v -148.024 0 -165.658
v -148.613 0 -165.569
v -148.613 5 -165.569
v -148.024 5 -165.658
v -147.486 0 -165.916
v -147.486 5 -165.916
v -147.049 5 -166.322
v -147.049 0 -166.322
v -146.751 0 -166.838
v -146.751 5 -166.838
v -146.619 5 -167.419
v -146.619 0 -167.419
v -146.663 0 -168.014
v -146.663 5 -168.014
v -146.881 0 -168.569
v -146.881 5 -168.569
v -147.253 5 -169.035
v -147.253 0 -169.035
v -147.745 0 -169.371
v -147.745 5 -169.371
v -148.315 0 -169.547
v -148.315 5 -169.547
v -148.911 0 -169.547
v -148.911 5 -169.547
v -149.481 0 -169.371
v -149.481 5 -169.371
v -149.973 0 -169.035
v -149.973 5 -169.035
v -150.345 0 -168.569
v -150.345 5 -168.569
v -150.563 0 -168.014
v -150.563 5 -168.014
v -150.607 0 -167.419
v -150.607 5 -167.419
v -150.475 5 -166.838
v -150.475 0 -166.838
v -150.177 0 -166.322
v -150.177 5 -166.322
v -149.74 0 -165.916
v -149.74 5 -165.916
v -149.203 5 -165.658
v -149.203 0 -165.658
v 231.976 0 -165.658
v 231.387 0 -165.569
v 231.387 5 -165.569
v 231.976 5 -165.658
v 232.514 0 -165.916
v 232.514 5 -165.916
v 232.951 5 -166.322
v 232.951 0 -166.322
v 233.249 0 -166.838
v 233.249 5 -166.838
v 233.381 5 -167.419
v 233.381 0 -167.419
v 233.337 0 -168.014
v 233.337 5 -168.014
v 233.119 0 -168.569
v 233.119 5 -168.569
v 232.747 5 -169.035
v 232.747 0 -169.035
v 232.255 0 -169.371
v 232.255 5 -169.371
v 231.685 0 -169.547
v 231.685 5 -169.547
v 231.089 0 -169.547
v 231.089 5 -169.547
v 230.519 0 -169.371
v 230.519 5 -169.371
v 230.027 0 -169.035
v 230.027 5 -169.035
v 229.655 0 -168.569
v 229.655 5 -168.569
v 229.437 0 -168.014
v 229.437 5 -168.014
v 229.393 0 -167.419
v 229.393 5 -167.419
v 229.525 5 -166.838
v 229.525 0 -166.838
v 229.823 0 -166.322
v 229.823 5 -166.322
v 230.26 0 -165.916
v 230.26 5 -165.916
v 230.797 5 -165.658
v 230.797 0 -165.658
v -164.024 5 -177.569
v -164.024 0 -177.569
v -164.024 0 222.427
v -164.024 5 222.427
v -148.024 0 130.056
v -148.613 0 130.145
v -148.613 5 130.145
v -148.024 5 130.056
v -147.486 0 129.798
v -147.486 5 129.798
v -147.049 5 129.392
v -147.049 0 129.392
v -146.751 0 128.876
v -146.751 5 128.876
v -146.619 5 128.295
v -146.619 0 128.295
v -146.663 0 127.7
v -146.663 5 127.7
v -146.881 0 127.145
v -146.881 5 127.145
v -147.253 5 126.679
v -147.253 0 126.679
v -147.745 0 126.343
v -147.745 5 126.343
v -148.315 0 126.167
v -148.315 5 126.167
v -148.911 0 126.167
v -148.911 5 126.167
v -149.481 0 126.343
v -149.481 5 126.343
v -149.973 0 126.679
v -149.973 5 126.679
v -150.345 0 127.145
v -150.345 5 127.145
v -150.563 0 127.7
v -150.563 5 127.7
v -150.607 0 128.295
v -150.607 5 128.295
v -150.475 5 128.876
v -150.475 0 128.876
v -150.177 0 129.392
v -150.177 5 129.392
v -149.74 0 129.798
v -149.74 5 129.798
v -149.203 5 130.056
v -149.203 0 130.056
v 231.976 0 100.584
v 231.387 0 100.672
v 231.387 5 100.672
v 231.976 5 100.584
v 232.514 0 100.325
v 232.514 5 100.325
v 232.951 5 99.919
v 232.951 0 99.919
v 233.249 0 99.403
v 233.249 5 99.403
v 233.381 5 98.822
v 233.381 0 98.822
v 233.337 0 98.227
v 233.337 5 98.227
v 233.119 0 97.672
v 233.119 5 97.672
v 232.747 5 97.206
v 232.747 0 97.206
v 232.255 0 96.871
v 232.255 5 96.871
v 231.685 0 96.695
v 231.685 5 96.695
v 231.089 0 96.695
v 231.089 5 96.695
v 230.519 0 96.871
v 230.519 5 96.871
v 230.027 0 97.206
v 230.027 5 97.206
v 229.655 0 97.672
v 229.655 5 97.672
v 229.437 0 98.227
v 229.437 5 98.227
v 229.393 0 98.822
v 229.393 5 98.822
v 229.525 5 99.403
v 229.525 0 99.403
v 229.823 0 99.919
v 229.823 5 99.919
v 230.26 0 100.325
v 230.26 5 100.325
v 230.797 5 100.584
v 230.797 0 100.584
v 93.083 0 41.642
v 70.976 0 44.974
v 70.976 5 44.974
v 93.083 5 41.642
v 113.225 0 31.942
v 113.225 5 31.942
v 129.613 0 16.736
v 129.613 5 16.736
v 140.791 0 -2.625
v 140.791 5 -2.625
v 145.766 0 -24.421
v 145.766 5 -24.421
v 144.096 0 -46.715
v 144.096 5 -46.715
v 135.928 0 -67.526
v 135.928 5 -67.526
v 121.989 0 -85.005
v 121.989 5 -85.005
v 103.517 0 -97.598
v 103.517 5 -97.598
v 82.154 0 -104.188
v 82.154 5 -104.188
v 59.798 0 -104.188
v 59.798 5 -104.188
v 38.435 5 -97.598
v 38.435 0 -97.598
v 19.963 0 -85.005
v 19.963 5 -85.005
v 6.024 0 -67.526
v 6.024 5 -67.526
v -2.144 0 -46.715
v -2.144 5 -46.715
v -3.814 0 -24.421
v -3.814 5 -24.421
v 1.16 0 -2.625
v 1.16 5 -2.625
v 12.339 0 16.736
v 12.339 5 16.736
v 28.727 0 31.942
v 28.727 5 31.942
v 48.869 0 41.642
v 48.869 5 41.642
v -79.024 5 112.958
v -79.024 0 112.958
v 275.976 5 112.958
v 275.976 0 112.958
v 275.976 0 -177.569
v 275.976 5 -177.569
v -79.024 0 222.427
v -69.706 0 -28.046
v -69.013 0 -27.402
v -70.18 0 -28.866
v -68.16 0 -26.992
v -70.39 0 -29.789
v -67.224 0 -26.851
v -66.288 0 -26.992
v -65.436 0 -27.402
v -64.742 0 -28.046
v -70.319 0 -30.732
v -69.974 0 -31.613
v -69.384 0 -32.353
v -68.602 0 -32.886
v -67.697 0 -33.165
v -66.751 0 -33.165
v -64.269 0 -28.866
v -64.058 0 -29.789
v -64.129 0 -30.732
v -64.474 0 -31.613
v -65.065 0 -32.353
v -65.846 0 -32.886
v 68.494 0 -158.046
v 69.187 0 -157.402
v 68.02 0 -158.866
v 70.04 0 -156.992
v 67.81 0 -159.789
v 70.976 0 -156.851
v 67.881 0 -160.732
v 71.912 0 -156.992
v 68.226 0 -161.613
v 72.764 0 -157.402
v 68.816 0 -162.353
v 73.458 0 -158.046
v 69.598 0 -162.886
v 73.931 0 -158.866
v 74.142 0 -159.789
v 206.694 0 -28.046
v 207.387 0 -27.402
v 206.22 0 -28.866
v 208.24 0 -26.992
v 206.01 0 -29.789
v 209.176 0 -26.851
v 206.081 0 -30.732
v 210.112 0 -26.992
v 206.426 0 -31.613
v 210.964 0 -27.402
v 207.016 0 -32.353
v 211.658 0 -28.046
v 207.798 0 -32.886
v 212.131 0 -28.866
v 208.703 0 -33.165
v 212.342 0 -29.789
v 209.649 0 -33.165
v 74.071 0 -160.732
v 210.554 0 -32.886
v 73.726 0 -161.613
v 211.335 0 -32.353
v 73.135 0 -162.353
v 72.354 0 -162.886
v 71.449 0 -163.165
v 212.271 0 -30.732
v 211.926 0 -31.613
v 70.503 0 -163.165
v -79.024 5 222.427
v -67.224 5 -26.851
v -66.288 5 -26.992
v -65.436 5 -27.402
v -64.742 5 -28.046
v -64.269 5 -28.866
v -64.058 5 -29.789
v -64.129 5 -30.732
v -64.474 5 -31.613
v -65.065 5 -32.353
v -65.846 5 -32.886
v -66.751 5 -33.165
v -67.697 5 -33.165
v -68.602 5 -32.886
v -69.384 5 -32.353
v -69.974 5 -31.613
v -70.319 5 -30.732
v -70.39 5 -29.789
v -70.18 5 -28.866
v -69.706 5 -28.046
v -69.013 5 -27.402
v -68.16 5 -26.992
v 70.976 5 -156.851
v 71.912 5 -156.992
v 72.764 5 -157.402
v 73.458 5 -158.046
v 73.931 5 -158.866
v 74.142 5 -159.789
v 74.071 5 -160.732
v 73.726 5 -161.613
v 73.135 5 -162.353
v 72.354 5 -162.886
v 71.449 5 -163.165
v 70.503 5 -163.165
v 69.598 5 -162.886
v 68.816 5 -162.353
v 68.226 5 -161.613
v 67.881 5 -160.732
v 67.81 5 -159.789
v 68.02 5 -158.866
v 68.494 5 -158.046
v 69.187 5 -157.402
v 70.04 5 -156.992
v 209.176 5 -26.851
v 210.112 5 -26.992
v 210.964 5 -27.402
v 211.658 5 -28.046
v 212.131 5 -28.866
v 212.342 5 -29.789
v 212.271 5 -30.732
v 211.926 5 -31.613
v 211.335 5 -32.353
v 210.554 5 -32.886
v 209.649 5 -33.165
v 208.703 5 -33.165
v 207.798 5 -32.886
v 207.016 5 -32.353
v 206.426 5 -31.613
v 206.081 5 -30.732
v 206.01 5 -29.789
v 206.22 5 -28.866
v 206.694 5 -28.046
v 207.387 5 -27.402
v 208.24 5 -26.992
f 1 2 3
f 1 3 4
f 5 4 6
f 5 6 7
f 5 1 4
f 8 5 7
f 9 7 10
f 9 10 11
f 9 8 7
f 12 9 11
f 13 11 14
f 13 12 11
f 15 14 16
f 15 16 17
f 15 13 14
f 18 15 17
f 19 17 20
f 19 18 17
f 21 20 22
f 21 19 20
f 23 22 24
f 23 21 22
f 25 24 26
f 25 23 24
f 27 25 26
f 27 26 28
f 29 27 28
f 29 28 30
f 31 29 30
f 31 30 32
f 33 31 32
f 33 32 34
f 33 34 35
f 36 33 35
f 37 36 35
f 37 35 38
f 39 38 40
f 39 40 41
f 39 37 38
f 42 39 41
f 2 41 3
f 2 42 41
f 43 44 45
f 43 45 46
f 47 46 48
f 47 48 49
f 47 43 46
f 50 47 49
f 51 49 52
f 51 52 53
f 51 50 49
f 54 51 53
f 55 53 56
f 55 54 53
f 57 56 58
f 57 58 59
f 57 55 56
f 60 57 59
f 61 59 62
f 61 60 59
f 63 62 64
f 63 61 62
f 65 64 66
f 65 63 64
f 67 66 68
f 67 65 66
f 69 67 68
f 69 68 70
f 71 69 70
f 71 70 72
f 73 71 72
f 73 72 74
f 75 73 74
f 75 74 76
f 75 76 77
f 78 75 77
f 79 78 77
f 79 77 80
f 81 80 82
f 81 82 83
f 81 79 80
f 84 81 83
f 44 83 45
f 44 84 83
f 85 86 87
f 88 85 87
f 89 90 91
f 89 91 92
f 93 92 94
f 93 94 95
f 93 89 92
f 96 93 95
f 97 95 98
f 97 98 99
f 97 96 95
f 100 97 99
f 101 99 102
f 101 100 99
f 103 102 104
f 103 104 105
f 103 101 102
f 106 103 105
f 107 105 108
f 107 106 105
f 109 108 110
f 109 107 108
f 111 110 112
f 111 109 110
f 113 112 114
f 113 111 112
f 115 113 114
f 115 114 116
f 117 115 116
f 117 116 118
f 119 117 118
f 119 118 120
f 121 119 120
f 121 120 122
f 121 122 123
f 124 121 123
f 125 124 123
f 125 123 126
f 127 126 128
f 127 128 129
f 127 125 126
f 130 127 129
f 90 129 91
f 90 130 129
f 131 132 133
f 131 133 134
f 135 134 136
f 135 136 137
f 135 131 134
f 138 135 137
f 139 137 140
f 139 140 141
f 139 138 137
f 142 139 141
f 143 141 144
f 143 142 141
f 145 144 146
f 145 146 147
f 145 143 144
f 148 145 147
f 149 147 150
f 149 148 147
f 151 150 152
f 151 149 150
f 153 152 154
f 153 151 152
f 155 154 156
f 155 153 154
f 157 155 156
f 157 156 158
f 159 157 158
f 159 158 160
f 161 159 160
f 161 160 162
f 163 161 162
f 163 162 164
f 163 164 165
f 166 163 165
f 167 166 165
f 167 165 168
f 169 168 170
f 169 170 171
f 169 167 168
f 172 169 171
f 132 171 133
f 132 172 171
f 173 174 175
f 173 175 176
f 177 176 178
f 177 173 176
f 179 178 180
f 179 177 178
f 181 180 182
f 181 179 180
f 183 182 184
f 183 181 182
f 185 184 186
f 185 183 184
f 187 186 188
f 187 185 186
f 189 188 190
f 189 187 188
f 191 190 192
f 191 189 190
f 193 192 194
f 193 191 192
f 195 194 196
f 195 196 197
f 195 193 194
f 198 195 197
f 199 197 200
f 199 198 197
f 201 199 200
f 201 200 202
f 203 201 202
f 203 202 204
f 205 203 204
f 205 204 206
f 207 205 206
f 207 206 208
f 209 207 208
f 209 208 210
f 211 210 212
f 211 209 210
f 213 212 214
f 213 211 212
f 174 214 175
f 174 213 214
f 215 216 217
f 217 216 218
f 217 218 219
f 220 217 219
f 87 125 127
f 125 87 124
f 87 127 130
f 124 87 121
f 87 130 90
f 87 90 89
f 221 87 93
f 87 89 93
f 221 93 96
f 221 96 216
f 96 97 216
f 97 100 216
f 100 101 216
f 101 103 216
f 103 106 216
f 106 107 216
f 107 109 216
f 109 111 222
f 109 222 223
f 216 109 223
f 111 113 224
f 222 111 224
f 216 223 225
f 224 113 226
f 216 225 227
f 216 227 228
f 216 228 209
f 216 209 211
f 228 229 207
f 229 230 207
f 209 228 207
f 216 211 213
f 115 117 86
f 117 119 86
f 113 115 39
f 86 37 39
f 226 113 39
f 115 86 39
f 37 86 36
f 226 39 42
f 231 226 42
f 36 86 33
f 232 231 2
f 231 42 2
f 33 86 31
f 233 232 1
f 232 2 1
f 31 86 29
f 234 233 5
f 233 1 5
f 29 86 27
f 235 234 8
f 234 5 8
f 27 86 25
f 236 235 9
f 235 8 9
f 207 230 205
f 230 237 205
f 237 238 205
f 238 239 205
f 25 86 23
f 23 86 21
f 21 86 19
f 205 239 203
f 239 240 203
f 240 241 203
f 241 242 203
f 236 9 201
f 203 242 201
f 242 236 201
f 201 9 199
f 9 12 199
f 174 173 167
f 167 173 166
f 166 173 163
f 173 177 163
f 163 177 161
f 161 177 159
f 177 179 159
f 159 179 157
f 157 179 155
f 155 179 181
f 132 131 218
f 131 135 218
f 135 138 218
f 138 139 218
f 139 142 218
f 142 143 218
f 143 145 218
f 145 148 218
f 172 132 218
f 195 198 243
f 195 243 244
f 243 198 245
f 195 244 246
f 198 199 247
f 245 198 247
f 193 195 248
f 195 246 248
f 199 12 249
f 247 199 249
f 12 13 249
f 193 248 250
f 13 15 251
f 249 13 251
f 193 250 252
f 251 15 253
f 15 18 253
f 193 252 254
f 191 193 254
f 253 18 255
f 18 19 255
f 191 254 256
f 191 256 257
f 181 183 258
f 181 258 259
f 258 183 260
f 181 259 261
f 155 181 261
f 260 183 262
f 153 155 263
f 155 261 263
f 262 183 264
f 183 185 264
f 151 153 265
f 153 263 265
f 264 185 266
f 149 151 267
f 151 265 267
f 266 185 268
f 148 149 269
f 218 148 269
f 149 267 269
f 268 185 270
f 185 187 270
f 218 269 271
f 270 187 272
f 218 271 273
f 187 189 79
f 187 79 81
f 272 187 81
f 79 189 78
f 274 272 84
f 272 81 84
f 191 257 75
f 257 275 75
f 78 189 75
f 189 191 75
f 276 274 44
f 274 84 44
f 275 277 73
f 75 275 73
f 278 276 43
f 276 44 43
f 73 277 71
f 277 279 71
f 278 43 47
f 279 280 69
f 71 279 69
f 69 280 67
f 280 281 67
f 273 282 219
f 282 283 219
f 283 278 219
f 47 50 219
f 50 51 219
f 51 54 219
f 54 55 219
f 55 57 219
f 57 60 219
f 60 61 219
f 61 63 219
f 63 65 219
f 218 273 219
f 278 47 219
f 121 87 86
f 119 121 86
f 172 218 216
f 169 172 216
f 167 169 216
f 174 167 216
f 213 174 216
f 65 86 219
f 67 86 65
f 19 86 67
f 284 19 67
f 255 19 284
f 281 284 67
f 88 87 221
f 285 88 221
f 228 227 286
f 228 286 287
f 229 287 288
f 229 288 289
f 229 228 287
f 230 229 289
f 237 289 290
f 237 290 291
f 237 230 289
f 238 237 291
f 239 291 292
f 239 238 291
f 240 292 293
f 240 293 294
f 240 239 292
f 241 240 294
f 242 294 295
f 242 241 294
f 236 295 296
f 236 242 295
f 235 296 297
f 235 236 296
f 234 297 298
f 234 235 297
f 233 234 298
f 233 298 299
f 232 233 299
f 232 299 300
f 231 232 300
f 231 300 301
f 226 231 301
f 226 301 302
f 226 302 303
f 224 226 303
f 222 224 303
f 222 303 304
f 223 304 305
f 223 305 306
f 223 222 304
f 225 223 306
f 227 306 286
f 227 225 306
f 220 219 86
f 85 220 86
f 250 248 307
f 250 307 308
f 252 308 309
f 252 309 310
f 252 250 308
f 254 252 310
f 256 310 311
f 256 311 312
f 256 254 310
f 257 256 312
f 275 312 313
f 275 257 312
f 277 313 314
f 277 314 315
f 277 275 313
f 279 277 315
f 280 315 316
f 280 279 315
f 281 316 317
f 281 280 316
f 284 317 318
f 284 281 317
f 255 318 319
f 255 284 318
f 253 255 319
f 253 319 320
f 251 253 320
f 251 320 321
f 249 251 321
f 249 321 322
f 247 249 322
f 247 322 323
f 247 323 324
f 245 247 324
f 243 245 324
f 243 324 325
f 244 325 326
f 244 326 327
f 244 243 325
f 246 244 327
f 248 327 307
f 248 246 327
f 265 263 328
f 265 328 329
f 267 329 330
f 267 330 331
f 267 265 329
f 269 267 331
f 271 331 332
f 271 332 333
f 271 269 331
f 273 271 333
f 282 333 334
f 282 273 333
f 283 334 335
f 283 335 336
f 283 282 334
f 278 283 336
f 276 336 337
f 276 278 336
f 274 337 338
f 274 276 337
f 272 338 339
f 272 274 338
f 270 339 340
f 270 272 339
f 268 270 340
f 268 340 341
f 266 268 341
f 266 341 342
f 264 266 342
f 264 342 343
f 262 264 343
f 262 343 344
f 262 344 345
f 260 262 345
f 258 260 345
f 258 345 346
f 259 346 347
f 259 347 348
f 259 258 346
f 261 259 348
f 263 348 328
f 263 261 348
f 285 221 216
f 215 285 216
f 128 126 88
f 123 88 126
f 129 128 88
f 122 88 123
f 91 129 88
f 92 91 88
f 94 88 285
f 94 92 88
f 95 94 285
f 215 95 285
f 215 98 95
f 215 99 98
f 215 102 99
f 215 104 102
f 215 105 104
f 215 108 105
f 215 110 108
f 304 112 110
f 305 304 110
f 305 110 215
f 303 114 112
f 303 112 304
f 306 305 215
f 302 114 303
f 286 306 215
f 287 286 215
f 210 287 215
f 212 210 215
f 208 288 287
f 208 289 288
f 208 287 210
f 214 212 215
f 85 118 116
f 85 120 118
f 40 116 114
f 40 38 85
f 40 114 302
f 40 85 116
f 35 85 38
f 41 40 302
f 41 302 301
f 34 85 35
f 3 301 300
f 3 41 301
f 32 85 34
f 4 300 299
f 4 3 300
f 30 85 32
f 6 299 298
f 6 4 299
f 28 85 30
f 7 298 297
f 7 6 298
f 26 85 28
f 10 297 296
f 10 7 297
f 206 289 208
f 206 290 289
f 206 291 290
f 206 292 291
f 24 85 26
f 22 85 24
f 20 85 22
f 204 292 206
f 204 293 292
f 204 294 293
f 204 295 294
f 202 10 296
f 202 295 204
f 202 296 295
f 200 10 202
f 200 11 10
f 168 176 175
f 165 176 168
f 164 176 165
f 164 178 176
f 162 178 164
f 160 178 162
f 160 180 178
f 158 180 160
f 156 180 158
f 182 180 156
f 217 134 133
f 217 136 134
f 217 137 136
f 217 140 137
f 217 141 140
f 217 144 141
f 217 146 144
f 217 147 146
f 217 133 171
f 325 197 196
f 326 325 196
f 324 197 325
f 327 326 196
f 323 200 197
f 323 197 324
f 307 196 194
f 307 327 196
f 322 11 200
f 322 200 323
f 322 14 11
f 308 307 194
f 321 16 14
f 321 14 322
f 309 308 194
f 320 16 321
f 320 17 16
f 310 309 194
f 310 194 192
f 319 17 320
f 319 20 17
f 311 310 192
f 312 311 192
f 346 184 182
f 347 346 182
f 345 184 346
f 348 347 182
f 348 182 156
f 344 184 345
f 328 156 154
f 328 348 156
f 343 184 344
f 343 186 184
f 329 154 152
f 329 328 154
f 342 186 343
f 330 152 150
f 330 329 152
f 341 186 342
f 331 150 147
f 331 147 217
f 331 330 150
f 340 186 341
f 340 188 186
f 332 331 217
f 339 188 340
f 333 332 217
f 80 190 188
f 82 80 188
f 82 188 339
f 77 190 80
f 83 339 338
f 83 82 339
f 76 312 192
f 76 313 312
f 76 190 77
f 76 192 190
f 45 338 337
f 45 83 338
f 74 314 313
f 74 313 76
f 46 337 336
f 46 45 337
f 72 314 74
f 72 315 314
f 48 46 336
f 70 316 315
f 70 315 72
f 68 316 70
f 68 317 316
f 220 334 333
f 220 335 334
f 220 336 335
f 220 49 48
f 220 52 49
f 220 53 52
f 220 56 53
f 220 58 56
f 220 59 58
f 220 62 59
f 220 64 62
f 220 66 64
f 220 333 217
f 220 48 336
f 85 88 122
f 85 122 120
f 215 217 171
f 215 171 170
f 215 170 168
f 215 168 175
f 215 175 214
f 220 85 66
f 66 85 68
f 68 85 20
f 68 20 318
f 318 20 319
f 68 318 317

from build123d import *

# Parameters (mm, degrees)
CROQUIS2_R              = 75
CROQUIS2_R_2            = 2
CROQUIS2_R_3            = 3.175
SALIENTE_EXTRUIR2_DEPTH = 5


with BuildPart() as part:
    # Croquis2 → Saliente-Extruir2 (new body)
    with BuildSketch(Plane(origin=(0, 0, 0), x_dir=(1, 0, 0), z_dir=(0, 1, 0))):
        Polygon((-164.024069274, 177.568942162), (-164.024069274, -142.431057838), (-164.024069274, -189.256710106), (-164.024069274, -222.426710106), (-79.024069274, -222.426710106), (-79.024069274, -189.256710106), (-79.024069274, -142.431057838), (-79.024069274, -112.958468136), (275.975930726, -112.958468136), (275.975930726, 177.568942162), align=None)
        with Locations(Location((70.975930726, 30.02579809, 0), (0, 0, 270))):
            Circle(CROQUIS2_R, mode=Mode.SUBTRACT)
        with Locations(Location((-148.613055051, 167.568942162, 0), (0, 0, 270))):
            Circle(CROQUIS2_R_2, mode=Mode.SUBTRACT)
        with Locations(Location((-148.613055051, -128.145081947, 0), (0, 0, 270))):
            Circle(CROQUIS2_R_2, mode=Mode.SUBTRACT)
        with Locations(Location((231.386944949, -98.672492245, 0), (0, 0, 270))):
            Circle(CROQUIS2_R_2, mode=Mode.SUBTRACT)
        with Locations(Location((231.386944949, 167.568942162, 0), (0, 0, 270))):
            Circle(CROQUIS2_R_2, mode=Mode.SUBTRACT)
        with Locations(Location((209.175930726, 30.02579809, 0), (0, 0, 270))):
            Circle(CROQUIS2_R_3, mode=Mode.SUBTRACT)
        with Locations(Location((-67.224069274, 30.02579809, 0), (0, 0, 270))):
            Circle(CROQUIS2_R_3, mode=Mode.SUBTRACT)
        with Locations(Location((70.975930726, 160.02579809, 0), (0, 0, 270))):
            Circle(CROQUIS2_R_3, mode=Mode.SUBTRACT)
    extrude(amount=SALIENTE_EXTRUIR2_DEPTH)


solid = part.part
